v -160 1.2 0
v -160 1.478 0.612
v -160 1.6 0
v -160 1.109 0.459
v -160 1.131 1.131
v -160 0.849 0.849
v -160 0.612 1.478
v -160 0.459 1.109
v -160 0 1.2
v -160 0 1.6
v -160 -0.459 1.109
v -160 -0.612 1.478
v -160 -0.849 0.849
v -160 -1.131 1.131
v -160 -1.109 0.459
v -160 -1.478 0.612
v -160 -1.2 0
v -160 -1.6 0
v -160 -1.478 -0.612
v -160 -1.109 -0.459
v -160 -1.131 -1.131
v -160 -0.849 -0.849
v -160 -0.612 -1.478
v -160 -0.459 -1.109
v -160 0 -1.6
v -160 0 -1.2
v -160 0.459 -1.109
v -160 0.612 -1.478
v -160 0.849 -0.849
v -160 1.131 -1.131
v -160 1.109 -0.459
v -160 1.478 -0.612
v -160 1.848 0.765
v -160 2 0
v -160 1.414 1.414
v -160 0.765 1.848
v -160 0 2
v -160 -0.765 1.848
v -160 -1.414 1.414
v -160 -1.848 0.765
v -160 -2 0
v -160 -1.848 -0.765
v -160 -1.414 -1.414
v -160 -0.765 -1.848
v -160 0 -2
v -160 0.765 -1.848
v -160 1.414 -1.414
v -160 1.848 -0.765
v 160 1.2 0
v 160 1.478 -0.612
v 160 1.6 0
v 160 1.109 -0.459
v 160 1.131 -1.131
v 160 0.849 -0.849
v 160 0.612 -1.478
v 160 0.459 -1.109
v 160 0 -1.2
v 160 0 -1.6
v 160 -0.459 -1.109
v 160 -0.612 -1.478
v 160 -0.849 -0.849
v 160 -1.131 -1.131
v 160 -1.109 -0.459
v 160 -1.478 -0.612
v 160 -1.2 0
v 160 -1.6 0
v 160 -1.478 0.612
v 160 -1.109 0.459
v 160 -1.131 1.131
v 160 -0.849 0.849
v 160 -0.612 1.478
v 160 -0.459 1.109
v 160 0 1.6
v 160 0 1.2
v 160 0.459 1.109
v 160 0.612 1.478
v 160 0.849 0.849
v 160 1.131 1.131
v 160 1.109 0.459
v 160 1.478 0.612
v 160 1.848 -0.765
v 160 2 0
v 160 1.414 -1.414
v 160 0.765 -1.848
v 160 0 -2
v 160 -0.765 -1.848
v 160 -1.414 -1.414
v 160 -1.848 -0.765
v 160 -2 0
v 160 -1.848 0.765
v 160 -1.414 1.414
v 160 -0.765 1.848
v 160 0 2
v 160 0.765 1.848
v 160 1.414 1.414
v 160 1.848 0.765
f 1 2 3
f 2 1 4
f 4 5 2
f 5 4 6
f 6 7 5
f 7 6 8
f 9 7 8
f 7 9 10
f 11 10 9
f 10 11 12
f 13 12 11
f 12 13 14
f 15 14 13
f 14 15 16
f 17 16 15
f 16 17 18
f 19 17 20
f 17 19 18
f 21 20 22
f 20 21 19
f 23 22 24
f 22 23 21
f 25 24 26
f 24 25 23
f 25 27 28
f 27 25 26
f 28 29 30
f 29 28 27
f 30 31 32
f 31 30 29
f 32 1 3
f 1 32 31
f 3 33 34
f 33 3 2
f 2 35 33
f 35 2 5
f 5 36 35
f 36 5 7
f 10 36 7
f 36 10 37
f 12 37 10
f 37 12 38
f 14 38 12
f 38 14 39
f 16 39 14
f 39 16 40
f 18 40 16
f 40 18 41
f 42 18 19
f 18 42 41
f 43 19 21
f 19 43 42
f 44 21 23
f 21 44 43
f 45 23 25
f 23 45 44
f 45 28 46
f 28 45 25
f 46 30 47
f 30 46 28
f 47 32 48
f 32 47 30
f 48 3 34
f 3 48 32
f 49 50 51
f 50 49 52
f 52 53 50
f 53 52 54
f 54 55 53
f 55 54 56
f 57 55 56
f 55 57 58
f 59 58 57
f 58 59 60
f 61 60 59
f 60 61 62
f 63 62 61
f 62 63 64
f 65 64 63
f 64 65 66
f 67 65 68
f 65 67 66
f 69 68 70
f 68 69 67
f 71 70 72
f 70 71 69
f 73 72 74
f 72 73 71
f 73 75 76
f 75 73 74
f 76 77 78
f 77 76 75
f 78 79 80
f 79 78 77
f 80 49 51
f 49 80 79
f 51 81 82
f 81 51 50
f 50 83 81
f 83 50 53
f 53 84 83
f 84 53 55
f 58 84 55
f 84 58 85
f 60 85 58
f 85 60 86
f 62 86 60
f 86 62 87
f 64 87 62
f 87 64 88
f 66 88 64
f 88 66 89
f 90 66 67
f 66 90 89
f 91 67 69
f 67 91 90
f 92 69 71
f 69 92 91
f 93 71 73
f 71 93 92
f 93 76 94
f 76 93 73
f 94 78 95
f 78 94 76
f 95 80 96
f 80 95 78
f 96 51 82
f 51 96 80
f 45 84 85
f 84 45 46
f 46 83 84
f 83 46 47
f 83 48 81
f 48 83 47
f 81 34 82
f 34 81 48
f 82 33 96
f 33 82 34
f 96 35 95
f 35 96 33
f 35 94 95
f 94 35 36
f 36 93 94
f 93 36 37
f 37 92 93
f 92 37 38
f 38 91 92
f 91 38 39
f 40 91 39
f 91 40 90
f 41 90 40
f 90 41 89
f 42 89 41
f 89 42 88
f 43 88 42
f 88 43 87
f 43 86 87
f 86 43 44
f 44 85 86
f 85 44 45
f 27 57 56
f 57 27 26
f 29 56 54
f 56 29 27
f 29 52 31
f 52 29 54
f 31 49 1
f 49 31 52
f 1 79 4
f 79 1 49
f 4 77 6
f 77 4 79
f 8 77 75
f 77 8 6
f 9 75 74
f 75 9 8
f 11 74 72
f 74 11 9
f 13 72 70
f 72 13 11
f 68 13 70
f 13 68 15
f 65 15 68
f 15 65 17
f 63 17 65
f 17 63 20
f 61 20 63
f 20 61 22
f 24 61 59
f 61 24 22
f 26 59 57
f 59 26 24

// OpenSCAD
// file: ../p/4-4cyli.scad
use <../lib.scad>
function ldraw_lib__4_4cyli() = [
// 0 Cylinder 1.0
// 0 Name: 4-4cyli.dat
// 0 Author: James Jessiman
// 0 !LDRAW_ORG Primitive UPDATE 2005-01
// 0 !LICENSE Licensed under CC BY 2.0 and CC BY 4.0 : see CAreadme.txt
// 
// 0 BFC CERTIFY CCW
  [0,"BFC","CERTIFY"],
  [0,"BFC","CCW"],
// 
// 0 !HISTORY 1998-12-15 [PTadmin] Official Update 1998-10
// 0 !HISTORY 2002-03-23 [sbliss] Added BFC statement; merged headers from files in distributions LDraw 0.27 and Complete.
// 0 !HISTORY 2002-04-25 [PTadmin] Official Update 2002-02
// 0 !HISTORY 2004-12-14 [guyvivan] BFC CCW
// 0 !HISTORY 2005-12-28 [PTadmin] Official Update 2005-01
// 0 !HISTORY 2007-06-24 [PTadmin] Header formatted for Contributor Agreement
// 0 !HISTORY 2008-07-01 [PTadmin] Official Update 2008-01
// 
// 
// 4 16 1 1 0 0.9239 1 0.3827 0.9239 0 0.3827 1 0 0
  [4,16,1,1,0,0.9239,1,0.3827,0.9239,0,0.3827,1,0,0],
// 5 24 1 0 0 1 1 0 0.9239 0 0.3827 0.9239 0 -0.3827
  [5,24,1,0,0,1,1,0,0.9239,0,0.3827,0.9239,0,-0.3827],
// 4 16 0.9239 1 0.3827 0.7071 1 0.7071 0.7071 0 0.7071 0.9239 0 0.3827
  [4,16,0.9239,1,0.3827,0.7071,1,0.7071,0.7071,0,0.7071,0.9239,0,0.3827],
// 5 24 0.9239 0 0.3827 0.9239 1 0.3827 0.7071 0 0.7071 1 0 0
  [5,24,0.9239,0,0.3827,0.9239,1,0.3827,0.7071,0,0.7071,1,0,0],
// 4 16 0.7071 1 0.7071 0.3827 1 0.9239 0.3827 0 0.9239 0.7071 0 0.7071
  [4,16,0.7071,1,0.7071,0.3827,1,0.9239,0.3827,0,0.9239,0.7071,0,0.7071],
// 5 24 0.7071 0 0.7071 0.7071 1 0.7071 0.3827 0 0.9239 0.9239 0 0.3827
  [5,24,0.7071,0,0.7071,0.7071,1,0.7071,0.3827,0,0.9239,0.9239,0,0.3827],
// 4 16 0.3827 1 0.9239 0 1 1 0 0 1 0.3827 0 0.9239
  [4,16,0.3827,1,0.9239,0,1,1,0,0,1,0.3827,0,0.9239],
// 5 24 0.3827 0 0.9239 0.3827 1 0.9239 0 0 1 0.7071 0 0.7071
  [5,24,0.3827,0,0.9239,0.3827,1,0.9239,0,0,1,0.7071,0,0.7071],
// 4 16 0 1 1 -0.3827 1 0.9239 -0.3827 0 0.9239 0 0 1
  [4,16,0,1,1,-0.3827,1,0.9239,-0.3827,0,0.9239,0,0,1],
// 5 24 0 0 1 0 1 1 -0.3827 0 0.9239 0.3827 0 0.9239
  [5,24,0,0,1,0,1,1,-0.3827,0,0.9239,0.3827,0,0.9239],
// 4 16 -0.3827 1 0.9239 -0.7071 1 0.7071 -0.7071 0 0.7071 -0.3827 0 0.9239
  [4,16,-0.3827,1,0.9239,-0.7071,1,0.7071,-0.7071,0,0.7071,-0.3827,0,0.9239],
// 5 24 -0.3827 0 0.9239 -0.3827 1 0.9239 -0.7071 0 0.7071 0 0 1
  [5,24,-0.3827,0,0.9239,-0.3827,1,0.9239,-0.7071,0,0.7071,0,0,1],
// 4 16 -0.7071 1 0.7071 -0.9239 1 0.3827 -0.9239 0 0.3827 -0.7071 0 0.7071
  [4,16,-0.7071,1,0.7071,-0.9239,1,0.3827,-0.9239,0,0.3827,-0.7071,0,0.7071],
// 5 24 -0.7071 0 0.7071 -0.7071 1 0.7071 -0.9239 0 0.3827 -0.3827 0 0.9239
  [5,24,-0.7071,0,0.7071,-0.7071,1,0.7071,-0.9239,0,0.3827,-0.3827,0,0.9239],
// 4 16 -0.9239 1 0.3827 -1 1 0 -1 0 0 -0.9239 0 0.3827
  [4,16,-0.9239,1,0.3827,-1,1,0,-1,0,0,-0.9239,0,0.3827],
// 5 24 -0.9239 0 0.3827 -0.9239 1 0.3827 -1 0 0 -0.7071 0 0.7071
  [5,24,-0.9239,0,0.3827,-0.9239,1,0.3827,-1,0,0,-0.7071,0,0.7071],
// 4 16 -1 1 0 -0.9239 1 -0.3827 -0.9239 0 -0.3827 -1 0 0
  [4,16,-1,1,0,-0.9239,1,-0.3827,-0.9239,0,-0.3827,-1,0,0],
// 5 24 -1 0 0 -1 1 0 -0.9239 0 -0.3827 -0.9239 0 0.3827
  [5,24,-1,0,0,-1,1,0,-0.9239,0,-0.3827,-0.9239,0,0.3827],
// 4 16 -0.9239 1 -0.3827 -0.7071 1 -0.7071 -0.7071 0 -0.7071 -0.9239 0 -0.3827
  [4,16,-0.9239,1,-0.3827,-0.7071,1,-0.7071,-0.7071,0,-0.7071,-0.9239,0,-0.3827],
// 5 24 -0.9239 0 -0.3827 -0.9239 1 -0.3827 -0.7071 0 -0.7071 -1 0 0
  [5,24,-0.9239,0,-0.3827,-0.9239,1,-0.3827,-0.7071,0,-0.7071,-1,0,0],
// 4 16 -0.7071 1 -0.7071 -0.3827 1 -0.9239 -0.3827 0 -0.9239 -0.7071 0 -0.7071
  [4,16,-0.7071,1,-0.7071,-0.3827,1,-0.9239,-0.3827,0,-0.9239,-0.7071,0,-0.7071],
// 5 24 -0.7071 0 -0.7071 -0.7071 1 -0.7071 -0.3827 0 -0.9239 -0.9239 0 -0.3827
  [5,24,-0.7071,0,-0.7071,-0.7071,1,-0.7071,-0.3827,0,-0.9239,-0.9239,0,-0.3827],
// 4 16 -0.3827 1 -0.9239 0 1 -1 0 0 -1 -0.3827 0 -0.9239
  [4,16,-0.3827,1,-0.9239,0,1,-1,0,0,-1,-0.3827,0,-0.9239],
// 5 24 -0.3827 0 -0.9239 -0.3827 1 -0.9239 0 0 -1 -0.7071 0 -0.7071
  [5,24,-0.3827,0,-0.9239,-0.3827,1,-0.9239,0,0,-1,-0.7071,0,-0.7071],
// 4 16 0 1 -1 0.3827 1 -0.9239 0.3827 0 -0.9239 0 0 -1
  [4,16,0,1,-1,0.3827,1,-0.9239,0.3827,0,-0.9239,0,0,-1],
// 5 24 0 0 -1 0 1 -1 0.3827 0 -0.9239 -0.3827 0 -0.9239
  [5,24,0,0,-1,0,1,-1,0.3827,0,-0.9239,-0.3827,0,-0.9239],
// 4 16 0.3827 1 -0.9239 0.7071 1 -0.7071 0.7071 0 -0.7071 0.3827 0 -0.9239
  [4,16,0.3827,1,-0.9239,0.7071,1,-0.7071,0.7071,0,-0.7071,0.3827,0,-0.9239],
// 5 24 0.3827 0 -0.9239 0.3827 1 -0.9239 0.7071 0 -0.7071 0 0 -1
  [5,24,0.3827,0,-0.9239,0.3827,1,-0.9239,0.7071,0,-0.7071,0,0,-1],
// 4 16 0.7071 1 -0.7071 0.9239 1 -0.3827 0.9239 0 -0.3827 0.7071 0 -0.7071
  [4,16,0.7071,1,-0.7071,0.9239,1,-0.3827,0.9239,0,-0.3827,0.7071,0,-0.7071],
// 5 24 0.7071 0 -0.7071 0.7071 1 -0.7071 0.9239 0 -0.3827 0.3827 0 -0.9239
  [5,24,0.7071,0,-0.7071,0.7071,1,-0.7071,0.9239,0,-0.3827,0.3827,0,-0.9239],
// 4 16 0.9239 1 -0.3827 1 1 0 1 0 0 0.9239 0 -0.3827
  [4,16,0.9239,1,-0.3827,1,1,0,1,0,0,0.9239,0,-0.3827],
// 5 24 0.9239 0 -0.3827 0.9239 1 -0.3827 1 0 0 0.7071 0 -0.7071
  [5,24,0.9239,0,-0.3827,0.9239,1,-0.3827,1,0,0,0.7071,0,-0.7071],
// 0
];
makepoly(ldraw_lib__4_4cyli(), line=0.2);
// file: ../p/4-4ring4.scad
use <../lib.scad>
function ldraw_lib__4_4ring4() = [
// 0 Ring  4 x 1.0
// 0 Name: 4-4ring4.dat
// 0 Author: James Jessiman
// 0 !LDRAW_ORG Primitive UPDATE 2009-01
// 0 !LICENSE Licensed under CC BY 2.0 and CC BY 4.0 : see CAreadme.txt
// 
// 0 BFC CERTIFY CCW
  [0,"BFC","CERTIFY"],
  [0,"BFC","CCW"],
// 
// 0 !HISTORY 1998-12-15 [PTadmin] Official Update 1998-10
// 0 !HISTORY 2002-04-08 [BrickCaster] Modified for BFC compliance
// 0 !HISTORY 2002-04-25 [PTadmin] Official Update 2002-02
// 0 !HISTORY 2007-06-24 [PTadmin] Header formatted for Contributor Agreement
// 0 !HISTORY 2008-07-01 [PTadmin] Official Update 2008-01
// 0 !HISTORY 2008-08-26 [cwdee] Switch polygon winding and rename
// 0 !HISTORY 2009-05-02 [PTadmin] Official Update 2009-01
// 
// 
// 4 16 -1.9135 0 4.6195 -1.5308 0 3.6956 0 0 4 0 0 5
  [4,16,-1.9135,0,4.6195,-1.5308,0,3.6956,0,0,4,0,0,5],
// 4 16 -3.5355 0 3.5355 -2.8284 0 2.8284 -1.5308 0 3.6956 -1.9135 0 4.6195
  [4,16,-3.5355,0,3.5355,-2.8284,0,2.8284,-1.5308,0,3.6956,-1.9135,0,4.6195],
// 4 16 -4.6195 0 1.9135 -3.6956 0 1.5308 -2.8284 0 2.8284 -3.5355 0 3.5355
  [4,16,-4.6195,0,1.9135,-3.6956,0,1.5308,-2.8284,0,2.8284,-3.5355,0,3.5355],
// 4 16 -5 0 0 -4 0 0 -3.6956 0 1.5308 -4.6195 0 1.9135
  [4,16,-5,0,0,-4,0,0,-3.6956,0,1.5308,-4.6195,0,1.9135],
// 4 16 -4.6195 0 -1.9135 -3.6956 0 -1.5308 -4 0 0 -5 0 0
  [4,16,-4.6195,0,-1.9135,-3.6956,0,-1.5308,-4,0,0,-5,0,0],
// 4 16 -3.5355 0 -3.5355 -2.8284 0 -2.8284 -3.6956 0 -1.5308 -4.6195 0 -1.9135
  [4,16,-3.5355,0,-3.5355,-2.8284,0,-2.8284,-3.6956,0,-1.5308,-4.6195,0,-1.9135],
// 4 16 -1.9135 0 -4.6195 -1.5308 0 -3.6956 -2.8284 0 -2.8284 -3.5355 0 -3.5355
  [4,16,-1.9135,0,-4.6195,-1.5308,0,-3.6956,-2.8284,0,-2.8284,-3.5355,0,-3.5355],
// 4 16 0 0 -5 0 0 -4 -1.5308 0 -3.6956 -1.9135 0 -4.6195
  [4,16,0,0,-5,0,0,-4,-1.5308,0,-3.6956,-1.9135,0,-4.6195],
// 4 16 1.9135 0 -4.6195 1.5308 0 -3.6956 0 0 -4 0 0 -5
  [4,16,1.9135,0,-4.6195,1.5308,0,-3.6956,0,0,-4,0,0,-5],
// 4 16 3.5355 0 -3.5355 2.8284 0 -2.8284 1.5308 0 -3.6956 1.9135 0 -4.6195
  [4,16,3.5355,0,-3.5355,2.8284,0,-2.8284,1.5308,0,-3.6956,1.9135,0,-4.6195],
// 4 16 4.6195 0 -1.9135 3.6956 0 -1.5308 2.8284 0 -2.8284 3.5355 0 -3.5355
  [4,16,4.6195,0,-1.9135,3.6956,0,-1.5308,2.8284,0,-2.8284,3.5355,0,-3.5355],
// 4 16 5 0 0 4 0 0 3.6956 0 -1.5308 4.6195 0 -1.9135
  [4,16,5,0,0,4,0,0,3.6956,0,-1.5308,4.6195,0,-1.9135],
// 4 16 4.6195 0 1.9135 3.6956 0 1.5308 4 0 0 5 0 0
  [4,16,4.6195,0,1.9135,3.6956,0,1.5308,4,0,0,5,0,0],
// 4 16 3.5355 0 3.5355 2.8284 0 2.8284 3.6956 0 1.5308 4.6195 0 1.9135
  [4,16,3.5355,0,3.5355,2.8284,0,2.8284,3.6956,0,1.5308,4.6195,0,1.9135],
// 4 16 1.9135 0 4.6195 1.5308 0 3.6956 2.8284 0 2.8284 3.5355 0 3.5355
  [4,16,1.9135,0,4.6195,1.5308,0,3.6956,2.8284,0,2.8284,3.5355,0,3.5355],
// 4 16 0 0 5 0 0 4 1.5308 0 3.6956 1.9135 0 4.6195
  [4,16,0,0,5,0,0,4,1.5308,0,3.6956,1.9135,0,4.6195],
// 0
];
makepoly(ldraw_lib__4_4ring4(), line=0.2);
// file: ../p/4-4ring3.scad
use <../lib.scad>
function ldraw_lib__4_4ring3() = [
// 0 Ring  3 x 1.0
// 0 Name: 4-4ring3.dat
// 0 Author: James Jessiman
// 0 !LDRAW_ORG Primitive UPDATE 2009-01
// 0 !LICENSE Licensed under CC BY 2.0 and CC BY 4.0 : see CAreadme.txt
// 
// 0 BFC CERTIFY CCW
  [0,"BFC","CERTIFY"],
  [0,"BFC","CCW"],
// 
// 0 !HISTORY 1998-12-15 [PTadmin] Official Update 1998-10
// 0 !HISTORY 2002-04-05 [hafhead] Added BFC statement
// 0 !HISTORY 2002-04-25 [PTadmin] Official Update 2002-02
// 0 !HISTORY 2007-06-24 [PTadmin] Header formatted for Contributor Agreement
// 0 !HISTORY 2008-07-01 [PTadmin] Official Update 2008-01
// 0 !HISTORY 2008-08-26 [cwdee] Switch polygon winding and rename
// 0 !HISTORY 2009-05-02 [PTadmin] Official Update 2009-01
// 
// 
// 4 16 -1.5308 0 3.6956 -1.1481 0 2.7717 0 0 3 0 0 4
  [4,16,-1.5308,0,3.6956,-1.1481,0,2.7717,0,0,3,0,0,4],
// 4 16 -2.8284 0 2.8284 -2.1213 0 2.1213 -1.1481 0 2.7717 -1.5308 0 3.6956
  [4,16,-2.8284,0,2.8284,-2.1213,0,2.1213,-1.1481,0,2.7717,-1.5308,0,3.6956],
// 4 16 -3.6956 0 1.5308 -2.7717 0 1.1481 -2.1213 0 2.1213 -2.8284 0 2.8284
  [4,16,-3.6956,0,1.5308,-2.7717,0,1.1481,-2.1213,0,2.1213,-2.8284,0,2.8284],
// 4 16 -4 0 0 -3 0 0 -2.7717 0 1.1481 -3.6956 0 1.5308
  [4,16,-4,0,0,-3,0,0,-2.7717,0,1.1481,-3.6956,0,1.5308],
// 4 16 -3.6956 0 -1.5308 -2.7717 0 -1.1481 -3 0 0 -4 0 0
  [4,16,-3.6956,0,-1.5308,-2.7717,0,-1.1481,-3,0,0,-4,0,0],
// 4 16 -2.8284 0 -2.8284 -2.1213 0 -2.1213 -2.7717 0 -1.1481 -3.6956 0 -1.5308
  [4,16,-2.8284,0,-2.8284,-2.1213,0,-2.1213,-2.7717,0,-1.1481,-3.6956,0,-1.5308],
// 4 16 -1.5308 0 -3.6956 -1.1481 0 -2.7717 -2.1213 0 -2.1213 -2.8284 0 -2.8284
  [4,16,-1.5308,0,-3.6956,-1.1481,0,-2.7717,-2.1213,0,-2.1213,-2.8284,0,-2.8284],
// 4 16 0 0 -4 0 0 -3 -1.1481 0 -2.7717 -1.5308 0 -3.6956
  [4,16,0,0,-4,0,0,-3,-1.1481,0,-2.7717,-1.5308,0,-3.6956],
// 4 16 1.5308 0 -3.6956 1.1481 0 -2.7717 0 0 -3 0 0 -4
  [4,16,1.5308,0,-3.6956,1.1481,0,-2.7717,0,0,-3,0,0,-4],
// 4 16 2.8284 0 -2.8284 2.1213 0 -2.1213 1.1481 0 -2.7717 1.5308 0 -3.6956
  [4,16,2.8284,0,-2.8284,2.1213,0,-2.1213,1.1481,0,-2.7717,1.5308,0,-3.6956],
// 4 16 3.6956 0 -1.5308 2.7717 0 -1.1481 2.1213 0 -2.1213 2.8284 0 -2.8284
  [4,16,3.6956,0,-1.5308,2.7717,0,-1.1481,2.1213,0,-2.1213,2.8284,0,-2.8284],
// 4 16 4 0 0 3 0 0 2.7717 0 -1.1481 3.6956 0 -1.5308
  [4,16,4,0,0,3,0,0,2.7717,0,-1.1481,3.6956,0,-1.5308],
// 4 16 3.6956 0 1.5308 2.7717 0 1.1481 3 0 0 4 0 0
  [4,16,3.6956,0,1.5308,2.7717,0,1.1481,3,0,0,4,0,0],
// 4 16 2.8284 0 2.8284 2.1213 0 2.1213 2.7717 0 1.1481 3.6956 0 1.5308
  [4,16,2.8284,0,2.8284,2.1213,0,2.1213,2.7717,0,1.1481,3.6956,0,1.5308],
// 4 16 1.5308 0 3.6956 1.1481 0 2.7717 2.1213 0 2.1213 2.8284 0 2.8284
  [4,16,1.5308,0,3.6956,1.1481,0,2.7717,2.1213,0,2.1213,2.8284,0,2.8284],
// 4 16 0 0 4 0 0 3 1.1481 0 2.7717 1.5308 0 3.6956
  [4,16,0,0,4,0,0,3,1.1481,0,2.7717,1.5308,0,3.6956],
// 0
];
makepoly(ldraw_lib__4_4ring3(), line=0.2);
// file: ../p/4-4edge.scad
use <../lib.scad>
function ldraw_lib__4_4edge() = [
// 0 Circle 1.0
// 0 Name: 4-4edge.dat
// 0 Author: James Jessiman
// 0 !LDRAW_ORG Primitive UPDATE 2017-01
// 0 !LICENSE Licensed under CC BY 2.0 and CC BY 4.0 : see CAreadme.txt
// 
// 0 BFC CERTIFY CCW
  [0,"BFC","CERTIFY"],
  [0,"BFC","CCW"],
// 
// 0 !HISTORY 1998-12-15 [PTadmin] Official Update 1998-10
// 0 !HISTORY 2005-12-28 [PTadmin] Official Update 2005-01
// 0 !HISTORY 2007-06-24 [PTadmin] Header formatted for Contributor Agreement
// 0 !HISTORY 2008-07-01 [PTadmin] Official Update 2008-01
// 0 !HISTORY 2017-01-15 [Steffen] BFCed
// 0 !HISTORY 2017-12-30 [PTadmin] Official Update 2017-01
// 
// 
// 2 24 1 0 0 0.9239 0 0.3827
  [2,24,1,0,0,0.9239,0,0.3827],
// 2 24 0.9239 0 0.3827 0.7071 0 0.7071
  [2,24,0.9239,0,0.3827,0.7071,0,0.7071],
// 2 24 0.7071 0 0.7071 0.3827 0 0.9239
  [2,24,0.7071,0,0.7071,0.3827,0,0.9239],
// 2 24 0.3827 0 0.9239 0 0 1
  [2,24,0.3827,0,0.9239,0,0,1],
// 2 24 0 0 1 -0.3827 0 0.9239
  [2,24,0,0,1,-0.3827,0,0.9239],
// 2 24 -0.3827 0 0.9239 -0.7071 0 0.7071
  [2,24,-0.3827,0,0.9239,-0.7071,0,0.7071],
// 2 24 -0.7071 0 0.7071 -0.9239 0 0.3827
  [2,24,-0.7071,0,0.7071,-0.9239,0,0.3827],
// 2 24 -0.9239 0 0.3827 -1 0 -0
  [2,24,-0.9239,0,0.3827,-1,0,-0],
// 2 24 -1 0 -0 -0.9239 0 -0.3827
  [2,24,-1,0,-0,-0.9239,0,-0.3827],
// 2 24 -0.9239 0 -0.3827 -0.7071 0 -0.7071
  [2,24,-0.9239,0,-0.3827,-0.7071,0,-0.7071],
// 2 24 -0.7071 0 -0.7071 -0.3827 0 -0.9239
  [2,24,-0.7071,0,-0.7071,-0.3827,0,-0.9239],
// 2 24 -0.3827 0 -0.9239 0 0 -1
  [2,24,-0.3827,0,-0.9239,0,0,-1],
// 2 24 0 0 -1 0.3827 0 -0.9239
  [2,24,0,0,-1,0.3827,0,-0.9239],
// 2 24 0.3827 0 -0.9239 0.7071 0 -0.7071
  [2,24,0.3827,0,-0.9239,0.7071,0,-0.7071],
// 2 24 0.7071 0 -0.7071 0.9239 0 -0.3827
  [2,24,0.7071,0,-0.7071,0.9239,0,-0.3827],
// 2 24 0.9239 0 -0.3827 1 0 0
  [2,24,0.9239,0,-0.3827,1,0,0],
];
makepoly(ldraw_lib__4_4edge(), line=0.2);
// file: 71533k03.scad
use <../lib.scad>
use <../p/4-4cyli.scad>
function ldraw_lib__71533k03() = [
// 0 ~Technic Pneumatic Tube Segment
// 0 Name: 71533k03.dat
// 0 Author: Jaco van der Molen [Jaco]
// 0 !LDRAW_ORG Part Flexible_Section UPDATE 2020-01
// 0 !LICENSE Licensed under CC BY 2.0 and CC BY 4.0 : see CAreadme.txt
// 
// 0 BFC CERTIFY CW
  [0,"BFC","CERTIFY"],
  [0,"BFC","CW"],
// 
// 0 !HISTORY 2003-11-30 [Steffen] BFCed
// 0 !HISTORY 2009-12-29 [PTadmin] Official Update 2009-03
// 0 !HISTORY 2020-06-27 [PTadmin] Renamed from 166
// 0 !HISTORY 2020-06-28 [PTadmin] Official Update 2020-01
// 
// 
// 1 16 0 0 0 5 0 0 0 1 0 0 0 5 4-4cyli.dat
  [1,16,0,0,0,5,0,0,0,1,0,0,0,5, ldraw_lib__4_4cyli()],
// 0 BFC INVERTNEXT
  [0,"BFC","INVERTNEXT"],
// 1 16 0 0 0 3 0 0 0 1 0 0 0 3 4-4cyli.dat
  [1,16,0,0,0,3,0,0,0,1,0,0,0,3, ldraw_lib__4_4cyli()],
// 0
];
makepoly(ldraw_lib__71533k03(), line=0.2);
// file: 71533k02.scad
use <../lib.scad>
use <../p/4-4edge.scad>
use <../p/4-4ring3.scad>
use <../p/4-4ring4.scad>
function ldraw_lib__71533k02() = [
// 0 ~Technic Pneumatic Tube End (Non-Bulged)
// 0 Name: 71533k02.dat
// 0 Author: Steffen [Steffen]
// 0 !LDRAW_ORG Part Flexible_Section UPDATE 2020-01
// 0 !LICENSE Licensed under CC BY 2.0 and CC BY 4.0 : see CAreadme.txt
// 
// 0 BFC CERTIFY CCW
  [0,"BFC","CERTIFY"],
  [0,"BFC","CCW"],
// 
// 0 !HISTORY 2020-06-28 [PTadmin] Official Update 2020-01
// 
// 
// 0 // This file goes together with 71533k01.dat and 71533k03.dat.
// 0 // Those 3 files can be used to create Technic Pneumatic Tubes
// 0 // with either bulged or non-bulged ends.
// 
// 1 16 0 0 0 1 0 0 0 1 0 0 0 1 4-4ring3.dat
  [1,16,0,0,0,1,0,0,0,1,0,0,0,1, ldraw_lib__4_4ring3()],
// 1 16 0 0 0 1 0 0 0 1 0 0 0 1 4-4ring4.dat
  [1,16,0,0,0,1,0,0,0,1,0,0,0,1, ldraw_lib__4_4ring4()],
// 1 16 0 0 0 3 0 0 0 3 0 0 0 3 4-4edge.dat
  [1,16,0,0,0,3,0,0,0,3,0,0,0,3, ldraw_lib__4_4edge()],
// 1 16 0 0 0 5 0 0 0 5 0 0 0 5 4-4edge.dat
  [1,16,0,0,0,5,0,0,0,5,0,0,0,5, ldraw_lib__4_4edge()],
];
makepoly(ldraw_lib__71533k02(), line=0.2);
// main file
use <../lib.scad>
use <71533k02.scad>
use <71533k03.scad>
function ldraw_lib__26438_f1() = [
// 0 Technic Pneumatic Tube 40L
// 0 Name: 26438-f1.dat
// 0 Author: Philippe Hurbain [Philo]
// 0 !LDRAW_ORG Part UPDATE 2020-02
// 0 !LICENSE Licensed under CC BY 2.0 and CC BY 4.0 : see CAreadme.txt
// 
// 0 BFC CERTIFY CCW
  [0,"BFC","CERTIFY"],
  [0,"BFC","CCW"],
// 
// 0 !KEYWORDS 320 mm
// 
// 0 !HISTORY 2020-09-05 [PTadmin] Official Update 2020-02
// 
// 
// 1 16 -400 0 0 0 1 0 1 0 0 0 0 1 71533k02.dat
  [1,16,-400,0,0,0,1,0,1,0,0,0,0,1, ldraw_lib__71533k02()],
// 1 16 400 0 0 0 -1 0 -1 0 0 0 0 1 71533k02.dat
  [1,16,400,0,0,0,-1,0,-1,0,0,0,0,1, ldraw_lib__71533k02()],
// 1 16 -400 0 0 0 800 0 1 0 0 0 0 1 71533k03.dat
  [1,16,-400,0,0,0,800,0,1,0,0,0,0,1, ldraw_lib__71533k03()],
];
makepoly(ldraw_lib__26438_f1(), line=0.2);
